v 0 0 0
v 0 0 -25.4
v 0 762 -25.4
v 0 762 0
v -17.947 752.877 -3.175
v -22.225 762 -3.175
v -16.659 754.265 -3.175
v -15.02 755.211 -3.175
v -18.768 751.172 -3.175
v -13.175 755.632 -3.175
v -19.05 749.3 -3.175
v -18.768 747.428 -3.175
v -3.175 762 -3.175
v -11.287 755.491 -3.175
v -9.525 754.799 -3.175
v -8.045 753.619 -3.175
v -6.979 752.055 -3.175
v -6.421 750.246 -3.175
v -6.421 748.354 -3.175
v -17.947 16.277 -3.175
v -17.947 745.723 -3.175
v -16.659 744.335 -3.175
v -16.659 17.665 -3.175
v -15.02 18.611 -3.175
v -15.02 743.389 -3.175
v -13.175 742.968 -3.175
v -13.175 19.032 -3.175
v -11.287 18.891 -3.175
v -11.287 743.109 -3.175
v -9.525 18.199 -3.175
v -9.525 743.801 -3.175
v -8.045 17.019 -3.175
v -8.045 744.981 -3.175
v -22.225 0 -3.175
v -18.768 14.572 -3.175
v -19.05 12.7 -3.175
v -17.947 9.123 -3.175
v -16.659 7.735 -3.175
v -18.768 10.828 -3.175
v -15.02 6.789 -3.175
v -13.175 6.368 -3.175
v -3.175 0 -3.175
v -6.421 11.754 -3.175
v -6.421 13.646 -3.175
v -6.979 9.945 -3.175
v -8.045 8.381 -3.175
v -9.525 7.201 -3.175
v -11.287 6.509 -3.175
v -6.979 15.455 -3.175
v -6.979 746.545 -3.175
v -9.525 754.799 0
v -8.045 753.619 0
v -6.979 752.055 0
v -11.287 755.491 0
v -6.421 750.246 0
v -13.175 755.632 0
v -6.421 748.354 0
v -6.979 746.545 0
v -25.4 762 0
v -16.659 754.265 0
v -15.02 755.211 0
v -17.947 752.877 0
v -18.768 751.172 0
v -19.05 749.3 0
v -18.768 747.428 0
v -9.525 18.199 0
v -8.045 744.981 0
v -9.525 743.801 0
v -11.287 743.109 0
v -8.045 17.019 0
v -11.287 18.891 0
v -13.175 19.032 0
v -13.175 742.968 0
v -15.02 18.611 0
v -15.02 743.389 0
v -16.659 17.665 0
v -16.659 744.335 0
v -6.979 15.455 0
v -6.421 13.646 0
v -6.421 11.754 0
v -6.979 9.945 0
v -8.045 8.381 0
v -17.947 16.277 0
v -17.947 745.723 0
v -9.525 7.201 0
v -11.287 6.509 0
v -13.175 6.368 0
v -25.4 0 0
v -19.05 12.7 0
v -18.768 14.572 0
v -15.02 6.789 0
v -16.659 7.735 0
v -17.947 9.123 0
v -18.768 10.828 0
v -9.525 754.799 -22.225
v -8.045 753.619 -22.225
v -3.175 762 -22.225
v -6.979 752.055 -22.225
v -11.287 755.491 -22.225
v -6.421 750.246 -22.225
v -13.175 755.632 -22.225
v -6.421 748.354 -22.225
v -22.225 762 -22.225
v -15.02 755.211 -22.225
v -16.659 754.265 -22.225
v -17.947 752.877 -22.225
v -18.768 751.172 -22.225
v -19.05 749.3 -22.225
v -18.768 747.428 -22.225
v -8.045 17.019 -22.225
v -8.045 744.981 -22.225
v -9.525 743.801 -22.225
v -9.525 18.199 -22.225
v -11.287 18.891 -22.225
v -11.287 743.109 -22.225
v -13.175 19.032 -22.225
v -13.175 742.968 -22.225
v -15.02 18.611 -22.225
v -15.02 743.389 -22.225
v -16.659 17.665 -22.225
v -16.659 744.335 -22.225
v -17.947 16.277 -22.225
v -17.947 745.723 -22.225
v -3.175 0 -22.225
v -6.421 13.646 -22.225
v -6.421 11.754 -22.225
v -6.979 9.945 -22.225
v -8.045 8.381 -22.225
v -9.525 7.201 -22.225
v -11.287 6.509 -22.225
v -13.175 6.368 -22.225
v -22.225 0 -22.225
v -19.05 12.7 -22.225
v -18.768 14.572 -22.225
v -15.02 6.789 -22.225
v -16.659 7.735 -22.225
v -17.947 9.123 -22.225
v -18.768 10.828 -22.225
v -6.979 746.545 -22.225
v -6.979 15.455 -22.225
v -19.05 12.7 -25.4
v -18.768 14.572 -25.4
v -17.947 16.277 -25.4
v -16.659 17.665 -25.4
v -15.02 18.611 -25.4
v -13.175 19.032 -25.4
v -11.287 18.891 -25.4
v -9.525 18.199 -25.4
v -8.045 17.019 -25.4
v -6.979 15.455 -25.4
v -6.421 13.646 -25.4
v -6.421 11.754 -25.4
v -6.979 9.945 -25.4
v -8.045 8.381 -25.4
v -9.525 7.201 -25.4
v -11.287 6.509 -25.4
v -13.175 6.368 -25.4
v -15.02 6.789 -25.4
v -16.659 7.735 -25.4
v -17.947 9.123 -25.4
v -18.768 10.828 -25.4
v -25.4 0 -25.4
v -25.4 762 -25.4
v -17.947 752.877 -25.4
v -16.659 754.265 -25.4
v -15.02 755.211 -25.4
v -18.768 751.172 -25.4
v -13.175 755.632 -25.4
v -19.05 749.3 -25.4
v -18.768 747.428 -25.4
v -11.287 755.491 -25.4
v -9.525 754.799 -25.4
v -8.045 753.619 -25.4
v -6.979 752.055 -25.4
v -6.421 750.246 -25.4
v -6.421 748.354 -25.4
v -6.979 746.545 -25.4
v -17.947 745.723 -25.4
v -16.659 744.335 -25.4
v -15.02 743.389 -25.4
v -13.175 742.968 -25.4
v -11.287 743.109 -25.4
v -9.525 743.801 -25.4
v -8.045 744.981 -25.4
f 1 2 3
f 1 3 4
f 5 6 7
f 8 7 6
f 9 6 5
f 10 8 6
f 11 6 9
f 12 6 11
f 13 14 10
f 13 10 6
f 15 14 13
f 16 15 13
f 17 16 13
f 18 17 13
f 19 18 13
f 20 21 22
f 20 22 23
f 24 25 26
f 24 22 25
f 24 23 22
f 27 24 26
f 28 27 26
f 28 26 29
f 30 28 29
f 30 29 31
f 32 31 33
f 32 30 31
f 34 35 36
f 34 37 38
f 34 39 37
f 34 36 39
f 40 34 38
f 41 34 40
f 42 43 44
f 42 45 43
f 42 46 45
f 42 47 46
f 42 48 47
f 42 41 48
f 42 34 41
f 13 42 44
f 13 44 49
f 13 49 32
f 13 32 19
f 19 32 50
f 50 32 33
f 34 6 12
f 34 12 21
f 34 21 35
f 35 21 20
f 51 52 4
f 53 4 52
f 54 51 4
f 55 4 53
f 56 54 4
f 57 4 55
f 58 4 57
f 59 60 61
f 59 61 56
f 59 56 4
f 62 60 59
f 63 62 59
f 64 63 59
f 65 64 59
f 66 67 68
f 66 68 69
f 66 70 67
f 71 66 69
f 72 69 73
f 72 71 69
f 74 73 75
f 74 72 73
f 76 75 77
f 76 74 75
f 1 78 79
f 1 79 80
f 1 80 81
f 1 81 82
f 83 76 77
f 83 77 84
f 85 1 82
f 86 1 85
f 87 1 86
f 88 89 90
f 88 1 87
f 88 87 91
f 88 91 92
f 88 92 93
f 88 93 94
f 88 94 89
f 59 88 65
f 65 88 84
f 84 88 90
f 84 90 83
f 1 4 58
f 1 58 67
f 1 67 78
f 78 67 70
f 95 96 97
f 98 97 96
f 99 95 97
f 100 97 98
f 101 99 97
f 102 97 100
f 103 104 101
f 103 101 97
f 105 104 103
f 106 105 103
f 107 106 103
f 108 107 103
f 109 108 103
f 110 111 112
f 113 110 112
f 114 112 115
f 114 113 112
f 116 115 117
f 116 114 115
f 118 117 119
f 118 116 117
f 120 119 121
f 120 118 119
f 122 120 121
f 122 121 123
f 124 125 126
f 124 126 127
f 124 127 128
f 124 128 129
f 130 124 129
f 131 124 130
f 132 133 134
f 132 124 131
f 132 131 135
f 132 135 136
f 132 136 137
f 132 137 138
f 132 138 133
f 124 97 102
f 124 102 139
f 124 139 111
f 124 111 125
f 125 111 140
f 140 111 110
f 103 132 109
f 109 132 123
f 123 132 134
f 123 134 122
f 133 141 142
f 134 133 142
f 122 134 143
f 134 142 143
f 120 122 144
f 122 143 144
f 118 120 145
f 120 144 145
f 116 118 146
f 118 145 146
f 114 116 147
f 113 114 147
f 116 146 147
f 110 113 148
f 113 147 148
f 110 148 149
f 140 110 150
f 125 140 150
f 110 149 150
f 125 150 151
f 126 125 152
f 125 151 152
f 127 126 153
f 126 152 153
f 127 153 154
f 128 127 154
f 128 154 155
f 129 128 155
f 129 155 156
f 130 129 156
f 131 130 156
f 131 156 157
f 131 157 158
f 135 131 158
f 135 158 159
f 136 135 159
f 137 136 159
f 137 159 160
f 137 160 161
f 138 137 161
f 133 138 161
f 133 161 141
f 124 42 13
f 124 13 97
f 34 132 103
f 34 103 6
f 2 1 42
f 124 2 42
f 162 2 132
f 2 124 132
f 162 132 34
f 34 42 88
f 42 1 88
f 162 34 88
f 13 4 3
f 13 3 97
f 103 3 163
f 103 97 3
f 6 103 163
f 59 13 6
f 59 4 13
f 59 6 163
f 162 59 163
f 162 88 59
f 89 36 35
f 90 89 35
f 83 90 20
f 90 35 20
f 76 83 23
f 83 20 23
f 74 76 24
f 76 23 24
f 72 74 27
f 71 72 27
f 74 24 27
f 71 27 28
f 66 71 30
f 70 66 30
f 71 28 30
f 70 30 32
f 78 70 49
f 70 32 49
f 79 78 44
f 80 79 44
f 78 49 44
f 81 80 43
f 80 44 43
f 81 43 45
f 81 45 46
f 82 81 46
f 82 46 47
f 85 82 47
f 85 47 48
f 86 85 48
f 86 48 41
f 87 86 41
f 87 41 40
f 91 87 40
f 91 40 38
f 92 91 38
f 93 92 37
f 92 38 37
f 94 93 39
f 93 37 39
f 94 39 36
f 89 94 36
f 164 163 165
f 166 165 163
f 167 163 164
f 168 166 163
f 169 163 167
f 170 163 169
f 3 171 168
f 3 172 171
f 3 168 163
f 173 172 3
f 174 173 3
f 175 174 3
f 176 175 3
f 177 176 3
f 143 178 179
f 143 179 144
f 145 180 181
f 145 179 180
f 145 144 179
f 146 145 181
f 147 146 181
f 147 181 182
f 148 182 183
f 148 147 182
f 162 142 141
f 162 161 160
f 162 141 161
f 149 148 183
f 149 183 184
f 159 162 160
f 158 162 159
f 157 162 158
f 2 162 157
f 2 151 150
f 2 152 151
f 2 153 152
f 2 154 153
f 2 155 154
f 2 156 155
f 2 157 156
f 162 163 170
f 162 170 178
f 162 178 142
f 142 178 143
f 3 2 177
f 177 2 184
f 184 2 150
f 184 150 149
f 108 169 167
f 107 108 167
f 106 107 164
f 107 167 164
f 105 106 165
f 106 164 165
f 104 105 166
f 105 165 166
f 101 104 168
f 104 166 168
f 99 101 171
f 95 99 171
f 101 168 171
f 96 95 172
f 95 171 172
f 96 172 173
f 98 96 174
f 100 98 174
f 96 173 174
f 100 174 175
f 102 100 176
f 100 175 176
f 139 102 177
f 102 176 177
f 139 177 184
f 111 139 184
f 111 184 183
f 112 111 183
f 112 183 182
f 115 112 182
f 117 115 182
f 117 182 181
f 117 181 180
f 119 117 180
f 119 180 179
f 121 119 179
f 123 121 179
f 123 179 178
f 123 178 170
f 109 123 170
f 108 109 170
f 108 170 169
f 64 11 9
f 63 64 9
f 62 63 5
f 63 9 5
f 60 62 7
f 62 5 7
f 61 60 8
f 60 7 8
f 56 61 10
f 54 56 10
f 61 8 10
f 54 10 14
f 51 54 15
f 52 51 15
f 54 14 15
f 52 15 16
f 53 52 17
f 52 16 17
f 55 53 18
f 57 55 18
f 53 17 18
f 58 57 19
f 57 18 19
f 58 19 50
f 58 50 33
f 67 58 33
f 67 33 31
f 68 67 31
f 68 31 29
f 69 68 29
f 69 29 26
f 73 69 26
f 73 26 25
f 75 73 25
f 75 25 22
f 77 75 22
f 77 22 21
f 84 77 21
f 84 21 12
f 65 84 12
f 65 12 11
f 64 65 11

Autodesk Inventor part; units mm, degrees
ref_plane "YZ Plane" through (0, 0, 0) normal (1, 0, 0) x (0, 1, 0)
ref_plane "XZ Plane" through (0, 0, 0) normal (0, 1, 0) x (-1, 0, 0)
ref_plane "XY Plane" through (0, 0, 0) normal (0, 0, 1) x (1, 0, 0)
sketch "Sketch1" plane through (0, 0, 0) normal (0, 1, 0) x (-1, 0, 0)
  line L0 (0, 0) -> (25.4, 0)
  line L1 (25.4, 0) -> (25.4, -25.4)
  line L2 (25.4, -25.4) -> (0, -25.4)
  line L3 (0, -25.4) -> (0, 0)
  line L4 (22.225, -3.175) -> (3.175, -3.175)
  line L5 (3.175, -3.175) -> (3.175, -22.225)
  line L6 (3.175, -22.225) -> (22.225, -22.225)
  line L7 (22.225, -22.225) -> (22.225, -3.175)
  dimension "d0" = 25.4
  dimension "d1" = 25.4
  dimension "d2" = 3.175
extrude "Extrusion1" add sketch "Sketch1" along normal blind 762
sketch "Sketch2" plane through (0, 0, -25.4) normal (0, 0, -1) x (-1, 0, 0)
  circle A0 centre (12.7, 12.7) radius 6.35
  circle A1 centre (12.7, 749.3) radius 6.35
  line L0 (25.4, 0) -> (25.4, 762) projected
  line L1 (22.225, 762) -> (3.175, 762) projected
  line L2 (25.4, 0) -> (0, 0) projected
  dimension "d5" = 12.7
  dimension "d6" = 12.7
  dimension "d7" = 12.7
  dimension "d8" = 12.7
  dimension "d9" = 12.7
  dimension "d10" = 12.7
extrude "Extrusion2" cut sketch "Sketch2" against normal blind 25.4
properties part number "upper arm"
